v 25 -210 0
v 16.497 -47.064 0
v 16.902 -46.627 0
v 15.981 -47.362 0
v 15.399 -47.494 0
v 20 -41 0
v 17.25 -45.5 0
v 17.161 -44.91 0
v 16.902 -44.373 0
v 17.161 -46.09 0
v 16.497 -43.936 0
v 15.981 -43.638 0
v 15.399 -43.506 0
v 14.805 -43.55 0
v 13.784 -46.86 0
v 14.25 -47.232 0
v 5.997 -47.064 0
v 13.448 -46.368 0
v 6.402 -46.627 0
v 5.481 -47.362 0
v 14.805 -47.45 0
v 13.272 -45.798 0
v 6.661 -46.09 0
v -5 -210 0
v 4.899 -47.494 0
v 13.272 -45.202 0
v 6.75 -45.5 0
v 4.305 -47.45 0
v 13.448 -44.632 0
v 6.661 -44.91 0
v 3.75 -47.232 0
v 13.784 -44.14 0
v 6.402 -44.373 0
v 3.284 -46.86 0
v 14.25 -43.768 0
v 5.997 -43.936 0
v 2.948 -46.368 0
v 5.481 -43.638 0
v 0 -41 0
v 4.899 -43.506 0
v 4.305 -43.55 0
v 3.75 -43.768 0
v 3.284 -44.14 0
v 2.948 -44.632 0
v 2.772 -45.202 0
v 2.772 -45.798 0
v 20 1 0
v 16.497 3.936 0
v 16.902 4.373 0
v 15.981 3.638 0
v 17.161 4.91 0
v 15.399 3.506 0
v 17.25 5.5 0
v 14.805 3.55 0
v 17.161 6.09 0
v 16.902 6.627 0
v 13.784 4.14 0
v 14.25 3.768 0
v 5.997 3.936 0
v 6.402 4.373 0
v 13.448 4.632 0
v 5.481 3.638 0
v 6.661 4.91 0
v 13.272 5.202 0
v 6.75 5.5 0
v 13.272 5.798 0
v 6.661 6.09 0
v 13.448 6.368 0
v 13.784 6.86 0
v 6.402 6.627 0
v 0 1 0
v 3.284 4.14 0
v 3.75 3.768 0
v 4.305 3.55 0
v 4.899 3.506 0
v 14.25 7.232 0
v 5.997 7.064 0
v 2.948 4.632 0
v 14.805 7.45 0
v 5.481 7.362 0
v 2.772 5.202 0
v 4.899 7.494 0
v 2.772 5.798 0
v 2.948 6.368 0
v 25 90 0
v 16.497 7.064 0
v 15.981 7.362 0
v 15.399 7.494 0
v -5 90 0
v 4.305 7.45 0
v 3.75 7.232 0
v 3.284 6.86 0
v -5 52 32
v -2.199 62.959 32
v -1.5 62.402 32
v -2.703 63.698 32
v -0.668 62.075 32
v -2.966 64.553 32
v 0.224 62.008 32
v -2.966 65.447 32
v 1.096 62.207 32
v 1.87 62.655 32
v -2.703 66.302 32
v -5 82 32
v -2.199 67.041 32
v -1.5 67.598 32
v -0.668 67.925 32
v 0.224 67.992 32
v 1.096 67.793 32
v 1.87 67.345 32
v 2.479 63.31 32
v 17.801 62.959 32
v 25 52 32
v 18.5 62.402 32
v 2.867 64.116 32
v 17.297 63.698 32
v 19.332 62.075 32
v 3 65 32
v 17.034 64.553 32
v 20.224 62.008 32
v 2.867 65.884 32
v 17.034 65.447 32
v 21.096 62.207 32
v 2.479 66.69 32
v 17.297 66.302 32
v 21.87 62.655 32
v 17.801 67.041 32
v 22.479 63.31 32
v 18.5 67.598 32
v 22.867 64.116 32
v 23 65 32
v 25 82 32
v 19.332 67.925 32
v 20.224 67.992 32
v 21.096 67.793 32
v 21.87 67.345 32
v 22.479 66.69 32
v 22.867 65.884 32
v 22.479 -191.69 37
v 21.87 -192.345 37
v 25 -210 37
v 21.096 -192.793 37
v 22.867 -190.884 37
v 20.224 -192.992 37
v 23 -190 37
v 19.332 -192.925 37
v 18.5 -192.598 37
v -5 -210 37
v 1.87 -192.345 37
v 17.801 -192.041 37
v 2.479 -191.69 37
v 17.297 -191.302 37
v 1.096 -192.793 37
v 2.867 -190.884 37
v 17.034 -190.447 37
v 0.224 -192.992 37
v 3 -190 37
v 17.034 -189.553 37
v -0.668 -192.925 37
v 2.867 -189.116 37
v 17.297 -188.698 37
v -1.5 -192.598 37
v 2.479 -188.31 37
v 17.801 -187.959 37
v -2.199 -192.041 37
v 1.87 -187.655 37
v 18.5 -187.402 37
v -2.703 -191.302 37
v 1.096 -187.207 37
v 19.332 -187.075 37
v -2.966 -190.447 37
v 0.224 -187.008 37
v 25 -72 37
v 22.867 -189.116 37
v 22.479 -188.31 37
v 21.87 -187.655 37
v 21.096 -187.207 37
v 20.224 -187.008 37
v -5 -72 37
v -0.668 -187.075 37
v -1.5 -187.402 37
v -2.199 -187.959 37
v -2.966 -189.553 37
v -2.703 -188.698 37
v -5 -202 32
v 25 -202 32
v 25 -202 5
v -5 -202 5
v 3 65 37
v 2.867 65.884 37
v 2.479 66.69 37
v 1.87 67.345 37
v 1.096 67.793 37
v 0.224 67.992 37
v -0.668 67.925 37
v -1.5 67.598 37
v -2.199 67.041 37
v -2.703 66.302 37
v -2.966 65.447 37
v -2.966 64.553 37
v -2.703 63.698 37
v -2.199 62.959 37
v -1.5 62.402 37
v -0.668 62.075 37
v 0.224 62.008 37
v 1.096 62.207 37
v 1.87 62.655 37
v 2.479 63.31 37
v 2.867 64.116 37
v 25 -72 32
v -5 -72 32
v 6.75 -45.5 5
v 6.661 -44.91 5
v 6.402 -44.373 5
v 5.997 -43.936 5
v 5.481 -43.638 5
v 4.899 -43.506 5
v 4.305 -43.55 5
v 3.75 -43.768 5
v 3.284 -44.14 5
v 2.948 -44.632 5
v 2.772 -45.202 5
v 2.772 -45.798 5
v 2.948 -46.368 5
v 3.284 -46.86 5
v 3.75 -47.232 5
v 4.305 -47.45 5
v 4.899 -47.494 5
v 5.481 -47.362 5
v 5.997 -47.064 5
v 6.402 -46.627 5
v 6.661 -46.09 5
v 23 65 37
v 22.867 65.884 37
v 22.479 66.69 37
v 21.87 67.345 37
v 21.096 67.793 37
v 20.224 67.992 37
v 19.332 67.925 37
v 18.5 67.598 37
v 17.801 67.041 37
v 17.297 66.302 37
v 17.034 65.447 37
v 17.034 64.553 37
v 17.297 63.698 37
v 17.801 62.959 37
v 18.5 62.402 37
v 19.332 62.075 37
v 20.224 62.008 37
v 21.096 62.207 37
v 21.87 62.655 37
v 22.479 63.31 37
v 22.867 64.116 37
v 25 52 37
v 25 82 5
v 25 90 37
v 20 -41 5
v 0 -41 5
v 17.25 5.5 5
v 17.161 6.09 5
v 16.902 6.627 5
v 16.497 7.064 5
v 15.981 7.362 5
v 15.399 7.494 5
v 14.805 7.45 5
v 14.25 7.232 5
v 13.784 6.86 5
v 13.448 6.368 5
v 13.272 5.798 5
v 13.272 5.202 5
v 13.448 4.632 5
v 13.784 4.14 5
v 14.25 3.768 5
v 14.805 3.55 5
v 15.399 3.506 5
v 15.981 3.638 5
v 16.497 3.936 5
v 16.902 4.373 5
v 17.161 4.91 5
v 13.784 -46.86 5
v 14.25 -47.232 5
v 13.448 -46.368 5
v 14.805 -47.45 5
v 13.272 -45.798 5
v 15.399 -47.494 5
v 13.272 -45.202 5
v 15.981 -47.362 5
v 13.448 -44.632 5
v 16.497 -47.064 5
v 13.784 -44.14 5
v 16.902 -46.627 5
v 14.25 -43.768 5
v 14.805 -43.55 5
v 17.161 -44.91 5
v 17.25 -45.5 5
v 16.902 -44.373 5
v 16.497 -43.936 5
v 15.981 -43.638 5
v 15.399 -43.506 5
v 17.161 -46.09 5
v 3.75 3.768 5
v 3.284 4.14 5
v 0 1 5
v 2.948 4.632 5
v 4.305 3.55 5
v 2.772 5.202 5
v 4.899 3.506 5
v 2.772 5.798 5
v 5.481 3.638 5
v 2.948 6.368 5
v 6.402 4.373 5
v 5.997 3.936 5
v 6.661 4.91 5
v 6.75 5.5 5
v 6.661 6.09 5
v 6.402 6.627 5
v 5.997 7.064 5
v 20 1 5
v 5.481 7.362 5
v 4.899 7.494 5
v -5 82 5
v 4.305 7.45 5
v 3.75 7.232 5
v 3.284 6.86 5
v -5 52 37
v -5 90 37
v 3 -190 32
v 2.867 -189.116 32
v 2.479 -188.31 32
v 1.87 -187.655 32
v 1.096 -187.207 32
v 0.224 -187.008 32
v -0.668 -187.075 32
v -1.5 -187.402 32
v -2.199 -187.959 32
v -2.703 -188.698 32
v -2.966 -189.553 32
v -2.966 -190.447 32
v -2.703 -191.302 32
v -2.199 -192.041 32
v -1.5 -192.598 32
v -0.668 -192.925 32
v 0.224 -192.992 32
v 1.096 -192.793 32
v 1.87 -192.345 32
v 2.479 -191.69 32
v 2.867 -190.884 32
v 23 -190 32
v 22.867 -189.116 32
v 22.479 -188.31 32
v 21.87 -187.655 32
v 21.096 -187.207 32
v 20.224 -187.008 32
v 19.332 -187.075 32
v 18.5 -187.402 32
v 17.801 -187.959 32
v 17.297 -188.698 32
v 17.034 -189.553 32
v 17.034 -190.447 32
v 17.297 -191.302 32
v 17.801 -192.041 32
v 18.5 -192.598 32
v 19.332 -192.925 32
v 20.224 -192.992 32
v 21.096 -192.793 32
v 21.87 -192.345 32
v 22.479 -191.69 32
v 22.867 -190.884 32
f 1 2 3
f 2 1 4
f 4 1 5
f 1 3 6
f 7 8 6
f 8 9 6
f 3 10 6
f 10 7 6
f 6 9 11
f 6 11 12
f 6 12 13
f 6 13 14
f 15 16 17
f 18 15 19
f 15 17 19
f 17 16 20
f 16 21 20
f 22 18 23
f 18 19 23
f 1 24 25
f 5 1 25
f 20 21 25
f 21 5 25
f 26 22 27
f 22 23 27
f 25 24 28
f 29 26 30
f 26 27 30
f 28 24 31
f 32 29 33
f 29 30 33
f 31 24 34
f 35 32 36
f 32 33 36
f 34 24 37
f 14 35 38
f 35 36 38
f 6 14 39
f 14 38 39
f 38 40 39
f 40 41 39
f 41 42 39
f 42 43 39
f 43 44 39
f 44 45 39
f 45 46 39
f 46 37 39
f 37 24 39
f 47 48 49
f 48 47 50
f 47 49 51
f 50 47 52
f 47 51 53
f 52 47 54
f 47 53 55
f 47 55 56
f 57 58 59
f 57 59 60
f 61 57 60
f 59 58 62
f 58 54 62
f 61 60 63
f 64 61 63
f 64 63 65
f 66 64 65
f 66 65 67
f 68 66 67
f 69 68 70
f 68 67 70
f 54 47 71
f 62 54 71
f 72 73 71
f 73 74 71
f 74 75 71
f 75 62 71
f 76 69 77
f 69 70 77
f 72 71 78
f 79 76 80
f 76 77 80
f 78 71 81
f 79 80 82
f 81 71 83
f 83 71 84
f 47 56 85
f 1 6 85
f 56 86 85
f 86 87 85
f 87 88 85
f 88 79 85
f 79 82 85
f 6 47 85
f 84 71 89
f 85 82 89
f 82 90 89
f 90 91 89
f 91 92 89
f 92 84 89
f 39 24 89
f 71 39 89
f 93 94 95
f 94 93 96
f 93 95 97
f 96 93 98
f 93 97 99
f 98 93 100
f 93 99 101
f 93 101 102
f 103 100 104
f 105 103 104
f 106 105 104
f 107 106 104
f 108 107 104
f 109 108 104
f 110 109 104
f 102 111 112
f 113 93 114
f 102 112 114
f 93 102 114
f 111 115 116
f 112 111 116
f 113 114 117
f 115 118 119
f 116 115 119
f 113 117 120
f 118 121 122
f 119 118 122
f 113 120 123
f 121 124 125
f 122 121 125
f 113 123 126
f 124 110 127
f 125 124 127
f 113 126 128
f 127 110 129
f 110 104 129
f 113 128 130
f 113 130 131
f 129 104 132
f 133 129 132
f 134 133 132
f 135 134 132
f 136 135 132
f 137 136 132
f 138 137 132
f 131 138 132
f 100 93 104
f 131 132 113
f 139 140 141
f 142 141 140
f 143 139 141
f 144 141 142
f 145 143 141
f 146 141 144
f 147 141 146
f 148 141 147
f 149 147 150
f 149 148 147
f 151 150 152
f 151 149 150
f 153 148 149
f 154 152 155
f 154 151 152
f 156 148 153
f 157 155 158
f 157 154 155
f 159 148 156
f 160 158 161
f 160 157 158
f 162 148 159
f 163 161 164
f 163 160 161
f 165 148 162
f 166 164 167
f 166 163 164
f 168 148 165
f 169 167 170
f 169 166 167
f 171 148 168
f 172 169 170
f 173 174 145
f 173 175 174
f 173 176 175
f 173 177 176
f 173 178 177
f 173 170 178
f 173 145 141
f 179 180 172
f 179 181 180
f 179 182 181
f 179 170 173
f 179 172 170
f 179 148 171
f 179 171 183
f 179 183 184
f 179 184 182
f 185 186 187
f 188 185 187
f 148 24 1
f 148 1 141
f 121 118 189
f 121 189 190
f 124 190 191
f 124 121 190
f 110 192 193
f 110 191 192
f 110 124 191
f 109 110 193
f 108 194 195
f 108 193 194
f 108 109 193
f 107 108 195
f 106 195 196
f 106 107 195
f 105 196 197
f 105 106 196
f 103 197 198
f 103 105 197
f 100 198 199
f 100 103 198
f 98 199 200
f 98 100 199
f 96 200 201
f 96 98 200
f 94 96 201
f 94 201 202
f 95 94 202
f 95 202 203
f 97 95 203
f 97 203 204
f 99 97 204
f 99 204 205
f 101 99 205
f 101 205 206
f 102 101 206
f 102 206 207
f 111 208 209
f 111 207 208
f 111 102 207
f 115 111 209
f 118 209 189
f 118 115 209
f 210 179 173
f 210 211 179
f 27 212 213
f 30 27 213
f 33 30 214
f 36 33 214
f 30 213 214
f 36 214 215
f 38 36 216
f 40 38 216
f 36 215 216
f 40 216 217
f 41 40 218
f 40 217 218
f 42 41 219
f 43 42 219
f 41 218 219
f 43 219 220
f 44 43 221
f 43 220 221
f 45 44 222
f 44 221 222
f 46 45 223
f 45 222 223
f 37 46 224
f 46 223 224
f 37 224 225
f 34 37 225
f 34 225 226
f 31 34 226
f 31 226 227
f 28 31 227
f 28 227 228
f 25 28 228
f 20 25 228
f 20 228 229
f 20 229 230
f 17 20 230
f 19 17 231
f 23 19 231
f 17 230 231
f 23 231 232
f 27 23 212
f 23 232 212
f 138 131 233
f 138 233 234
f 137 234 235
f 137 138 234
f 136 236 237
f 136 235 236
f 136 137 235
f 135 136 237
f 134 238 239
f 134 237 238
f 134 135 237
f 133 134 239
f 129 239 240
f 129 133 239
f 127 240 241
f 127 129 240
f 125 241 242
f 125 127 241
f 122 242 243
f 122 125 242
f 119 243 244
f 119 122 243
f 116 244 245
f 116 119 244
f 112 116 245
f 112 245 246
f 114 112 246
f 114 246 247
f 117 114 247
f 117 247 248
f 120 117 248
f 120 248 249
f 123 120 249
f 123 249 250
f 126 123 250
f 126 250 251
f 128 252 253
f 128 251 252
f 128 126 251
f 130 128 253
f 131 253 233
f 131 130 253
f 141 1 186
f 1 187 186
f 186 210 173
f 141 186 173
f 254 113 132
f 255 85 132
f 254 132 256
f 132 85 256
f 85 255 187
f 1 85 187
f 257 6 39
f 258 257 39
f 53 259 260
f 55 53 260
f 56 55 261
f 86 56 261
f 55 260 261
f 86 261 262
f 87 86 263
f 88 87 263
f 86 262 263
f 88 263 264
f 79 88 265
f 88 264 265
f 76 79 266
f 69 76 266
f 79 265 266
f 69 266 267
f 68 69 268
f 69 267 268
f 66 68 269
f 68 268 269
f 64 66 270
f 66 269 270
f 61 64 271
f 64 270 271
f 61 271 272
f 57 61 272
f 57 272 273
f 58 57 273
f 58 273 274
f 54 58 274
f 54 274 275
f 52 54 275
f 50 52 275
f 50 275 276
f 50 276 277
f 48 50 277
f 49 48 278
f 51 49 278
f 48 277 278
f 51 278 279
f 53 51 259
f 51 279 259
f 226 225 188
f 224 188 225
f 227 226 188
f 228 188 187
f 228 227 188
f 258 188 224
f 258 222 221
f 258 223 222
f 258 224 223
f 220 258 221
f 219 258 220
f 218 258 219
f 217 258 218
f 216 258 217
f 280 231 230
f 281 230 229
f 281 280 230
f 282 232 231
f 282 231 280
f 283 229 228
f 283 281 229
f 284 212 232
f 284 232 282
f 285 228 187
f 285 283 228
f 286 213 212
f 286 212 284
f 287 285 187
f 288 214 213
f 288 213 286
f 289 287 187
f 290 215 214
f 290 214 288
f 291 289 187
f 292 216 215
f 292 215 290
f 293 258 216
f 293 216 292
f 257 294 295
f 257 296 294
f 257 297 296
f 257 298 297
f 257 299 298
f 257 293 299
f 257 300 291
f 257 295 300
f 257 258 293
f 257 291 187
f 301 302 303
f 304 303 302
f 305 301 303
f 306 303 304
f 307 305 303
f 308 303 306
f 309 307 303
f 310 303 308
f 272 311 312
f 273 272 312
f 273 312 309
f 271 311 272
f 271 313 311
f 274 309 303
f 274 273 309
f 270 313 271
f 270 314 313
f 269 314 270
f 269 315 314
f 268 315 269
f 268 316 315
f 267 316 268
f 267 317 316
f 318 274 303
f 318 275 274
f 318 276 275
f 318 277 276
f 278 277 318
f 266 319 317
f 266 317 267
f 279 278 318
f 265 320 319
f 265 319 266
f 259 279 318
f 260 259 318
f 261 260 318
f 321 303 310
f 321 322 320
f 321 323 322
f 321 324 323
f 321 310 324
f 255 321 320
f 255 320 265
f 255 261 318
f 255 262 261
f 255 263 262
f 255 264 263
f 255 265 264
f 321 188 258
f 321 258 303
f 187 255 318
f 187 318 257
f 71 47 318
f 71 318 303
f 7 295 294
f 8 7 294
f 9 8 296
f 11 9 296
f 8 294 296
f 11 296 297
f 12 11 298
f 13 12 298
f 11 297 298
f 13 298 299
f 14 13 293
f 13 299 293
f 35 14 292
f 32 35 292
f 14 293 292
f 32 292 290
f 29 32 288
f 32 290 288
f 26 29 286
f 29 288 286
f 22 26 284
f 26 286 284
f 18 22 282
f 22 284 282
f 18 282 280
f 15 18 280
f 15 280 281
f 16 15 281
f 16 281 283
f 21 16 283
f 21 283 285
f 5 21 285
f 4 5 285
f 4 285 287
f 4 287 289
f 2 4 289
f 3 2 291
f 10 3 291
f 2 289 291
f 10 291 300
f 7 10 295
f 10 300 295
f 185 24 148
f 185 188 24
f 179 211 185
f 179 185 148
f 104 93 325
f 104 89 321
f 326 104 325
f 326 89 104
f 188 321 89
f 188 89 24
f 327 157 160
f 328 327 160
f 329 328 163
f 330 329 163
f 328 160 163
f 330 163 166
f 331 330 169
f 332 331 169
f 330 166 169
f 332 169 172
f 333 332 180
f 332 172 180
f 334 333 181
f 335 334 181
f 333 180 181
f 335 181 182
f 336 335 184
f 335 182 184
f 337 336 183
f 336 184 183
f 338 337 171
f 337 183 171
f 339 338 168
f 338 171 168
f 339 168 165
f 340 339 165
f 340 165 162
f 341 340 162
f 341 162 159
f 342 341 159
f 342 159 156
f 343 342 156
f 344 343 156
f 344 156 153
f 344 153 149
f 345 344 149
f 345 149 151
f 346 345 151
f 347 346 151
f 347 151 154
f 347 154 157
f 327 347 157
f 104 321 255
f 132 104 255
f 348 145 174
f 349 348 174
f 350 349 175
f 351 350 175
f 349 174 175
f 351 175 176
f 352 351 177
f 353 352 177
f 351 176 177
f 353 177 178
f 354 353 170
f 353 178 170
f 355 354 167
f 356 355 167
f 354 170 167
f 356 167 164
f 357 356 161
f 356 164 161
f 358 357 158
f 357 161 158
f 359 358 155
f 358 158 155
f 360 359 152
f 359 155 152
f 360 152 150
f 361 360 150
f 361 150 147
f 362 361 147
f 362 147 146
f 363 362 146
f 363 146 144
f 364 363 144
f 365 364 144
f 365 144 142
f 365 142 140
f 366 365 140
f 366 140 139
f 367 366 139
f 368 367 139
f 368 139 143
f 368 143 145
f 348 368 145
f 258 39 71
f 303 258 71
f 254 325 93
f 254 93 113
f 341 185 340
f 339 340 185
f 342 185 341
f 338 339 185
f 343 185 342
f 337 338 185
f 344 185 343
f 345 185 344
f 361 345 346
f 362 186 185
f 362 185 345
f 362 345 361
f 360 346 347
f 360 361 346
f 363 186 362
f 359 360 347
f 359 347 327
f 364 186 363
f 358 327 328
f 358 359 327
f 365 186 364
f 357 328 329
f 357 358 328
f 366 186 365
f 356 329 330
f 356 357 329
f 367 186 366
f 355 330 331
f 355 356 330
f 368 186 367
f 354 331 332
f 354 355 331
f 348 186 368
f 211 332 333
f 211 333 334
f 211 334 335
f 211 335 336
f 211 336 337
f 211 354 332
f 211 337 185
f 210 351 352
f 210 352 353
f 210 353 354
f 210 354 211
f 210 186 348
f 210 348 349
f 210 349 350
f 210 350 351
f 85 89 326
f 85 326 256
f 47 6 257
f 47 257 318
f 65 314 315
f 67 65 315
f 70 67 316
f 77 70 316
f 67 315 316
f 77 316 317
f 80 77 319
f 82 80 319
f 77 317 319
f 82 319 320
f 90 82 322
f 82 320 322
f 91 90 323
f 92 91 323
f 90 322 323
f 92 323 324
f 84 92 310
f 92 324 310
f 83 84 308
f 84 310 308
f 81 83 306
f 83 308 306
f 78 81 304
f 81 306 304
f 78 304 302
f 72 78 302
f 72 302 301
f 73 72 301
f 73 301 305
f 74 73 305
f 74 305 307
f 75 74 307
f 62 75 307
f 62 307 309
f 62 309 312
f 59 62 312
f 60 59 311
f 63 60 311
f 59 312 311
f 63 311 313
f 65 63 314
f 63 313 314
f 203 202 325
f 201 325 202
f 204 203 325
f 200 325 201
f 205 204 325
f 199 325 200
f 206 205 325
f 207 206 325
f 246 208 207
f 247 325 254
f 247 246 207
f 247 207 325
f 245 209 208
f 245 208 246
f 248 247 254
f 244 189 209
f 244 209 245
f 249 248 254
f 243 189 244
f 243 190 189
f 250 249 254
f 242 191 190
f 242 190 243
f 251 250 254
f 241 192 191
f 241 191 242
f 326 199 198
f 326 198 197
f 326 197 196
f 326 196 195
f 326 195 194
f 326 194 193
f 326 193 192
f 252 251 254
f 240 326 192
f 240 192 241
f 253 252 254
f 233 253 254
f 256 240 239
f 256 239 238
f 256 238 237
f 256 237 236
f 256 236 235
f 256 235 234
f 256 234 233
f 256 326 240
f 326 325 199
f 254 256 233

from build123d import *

# Parameters (mm, degrees)
SKETCH_2_W          = 30
SKETCH_2_H          = 60
SKETCH_2_W_2        = 20
SKETCH_2_H_2        = 40
EXTRUDE_1_DEPTH     = 5
SKETCH_3_R          = 2
CUT_EXTRUDE_1_DEPTH = 5
EXTRUDE_2_DEPTH     = 5
SKETCH_6_R          = 1.5
CUT_EXTRUDE_2_DEPTH = 5
SKETCH_7_W          = 5
SKETCH_7_H          = 10
CUT_EXTRUDE_3_DEPTH = 100
SKETCH_8_W          = 30
SKETCH_8_H          = 5
EXTRUDE_3_DEPTH     = 80
SKETCH_9_W          = 30
SKETCH_9_H          = 5
EXTRUDE_4_DEPTH     = 60
SKETCH_11_W         = 30
SKETCH_11_H         = 8
EXTRUDE_5_DEPTH     = 32
EXTRUDE_6_DEPTH     = 30
SKETCH_14_W         = 30
SKETCH_14_H         = 5
EXTRUDE_7_DEPTH     = 30
SKETCH_15_W         = 37
SKETCH_15_H         = 100
EXTRUDE_8_DEPTH     = 30
SKETCH_12_R         = 3
CUT_EXTRUDE_5_DEPTH = 50
SKETCH_16_W         = 27
SKETCH_16_H         = 100
CUT_EXTRUDE_6_DEPTH = 30
SKETCH_17_R         = 3
CUT_EXTRUDE_7_DEPTH = 30
SKETCH_18_W         = 20
SKETCH_18_H         = 1
CUT_EXTRUDE_8_DEPTH = 10


with BuildPart() as part:
    # 草图2 → 凸台-拉伸1 (new body)
    with BuildSketch(Plane.XY):
        with Locations((10, -20)):
            Rectangle(SKETCH_2_W, SKETCH_2_H)
        with Locations((10, -20)):
            Rectangle(SKETCH_2_W_2, SKETCH_2_H_2, mode=Mode.SUBTRACT)
    extrude(amount=EXTRUDE_1_DEPTH)

    # 草图3 → 切除-拉伸1 (cut)
    with BuildSketch(Plane.XY.offset(5)):
        with Locations((15.25, 5.5)):
            Circle(SKETCH_3_R)
        with Locations((15.25, -45.5)):
            Circle(SKETCH_3_R)
        with Locations((4.75, -45.5)):
            Circle(SKETCH_3_R)
        with Locations((4.75, 5.5)):
            Circle(SKETCH_3_R)
    extrude(amount=-CUT_EXTRUDE_1_DEPTH, mode=Mode.SUBTRACT)

    # 草图5 → 凸台-拉伸2 (add)
    with BuildSketch(Plane(origin=(25, 0, 0), x_dir=(0, 0, -1), z_dir=(1, 0, 0))):
        with BuildLine():
            Line((-5, -42), (-5, -40))
            Line((-5, -40), (0, -40))
            Line((0, -40), (0, -42))
            ThreePointArc((0, -42), (0.878679656, -44.121320344), (3, -45))
            Line((3, -45), (20, -45))
            Line((20, -45), (20, -50))
            Line((20, -50), (0, -50))
            Line((0, -50), (-5, -50))
            Line((-5, -50), (-25, -50))
            Line((-25, -50), (-25, -45))
            Line((-25, -45), (-8, -45))
            ThreePointArc((-8, -45), (-5.878679656, -44.121320344), (-5, -42))
        make_face()
    extrude_2 = extrude(amount=EXTRUDE_2_DEPTH)

    # 镜向1: 凸台-拉伸2 across plane
    add(extrude_2.mirror(Plane(origin=(10, 0, 0), x_dir=(0, 0, 1), z_dir=(1, 0, 0))))

    # 草图6 → 切除-拉伸2 (cut)
    with BuildSketch(Plane(origin=(0, -45, 0), x_dir=(1, 0, 0), z_dir=(0, 1, 0))):
        with Locations((-7.5, 12.5)):
            Circle(SKETCH_6_R)
        with Locations((-7.5, -17.5)):
            Circle(SKETCH_6_R)
        with Locations((27.5, -17.5)):
            Circle(SKETCH_6_R)
        with Locations((27.5, 12.5)):
            Circle(SKETCH_6_R)
    extrude(amount=-CUT_EXTRUDE_2_DEPTH, mode=Mode.SUBTRACT)

    # 草图7 → 切除-拉伸3 (cut)
    with BuildSketch(Plane.XY.offset(25)):
        with Locations((27.5, -45)):
            Rectangle(SKETCH_7_W, SKETCH_7_H)
        with Locations((-7.5, -45)):
            Rectangle(SKETCH_7_W, SKETCH_7_H)
    extrude(amount=-CUT_EXTRUDE_3_DEPTH, mode=Mode.SUBTRACT)

    # 草图8 → 凸台-拉伸3 (add)
    with BuildSketch(Plane(origin=(0, 10, 0), x_dir=(1, 0, 0), z_dir=(0, 1, 0))):
        with Locations((10, -2.5)):
            Rectangle(SKETCH_8_W, SKETCH_8_H)
    extrude(amount=EXTRUDE_3_DEPTH)

    # 草图9 → 凸台-拉伸4 (add)
    with BuildSketch(Plane.XZ.offset(50)):
        with Locations((10, 2.5)):
            Rectangle(SKETCH_9_W, SKETCH_9_H)
    extrude(amount=EXTRUDE_4_DEPTH)

    # 草图11 → 凸台-拉伸5 (add)
    with BuildSketch(Plane.XY.offset(5)):
        with Locations((10, -106)):
            Rectangle(SKETCH_11_W, SKETCH_11_H)
        with Locations((10, 86)):
            Rectangle(SKETCH_11_W, SKETCH_11_H)
    extrude(amount=EXTRUDE_5_DEPTH)

    # 草图13 → 凸台-拉伸6 (add)
    with BuildSketch(Plane(origin=(0, -102, 0), x_dir=(1, 0, 0), z_dir=(0, 1, 0))):
        Polygon((-5, -37), (25, -37), (25, -34.408335309), (25, -32), (-5, -32), align=None)
    extrude(amount=EXTRUDE_6_DEPTH)

    # 草图14 → 凸台-拉伸7 (add)
    with BuildSketch(Plane.XZ.offset(-82)):
        with Locations((10, 34.5)):
            Rectangle(SKETCH_14_W, SKETCH_14_H)
    extrude(amount=EXTRUDE_7_DEPTH)

    # 草图15 → 凸台-拉伸8 (add)
    with BuildSketch(Plane.ZY.offset(5)):
        with Locations((18.5, -160)):
            Rectangle(SKETCH_15_W, SKETCH_15_H)
    extrude(amount=-EXTRUDE_8_DEPTH)

    # 草图12 → 切除-拉伸5 (cut)
    with BuildSketch(Plane.XY.offset(5)):
        with Locations((0, 65)):
            Circle(SKETCH_12_R)
        with Locations((20, 65)):
            Circle(SKETCH_12_R)
    extrude(amount=CUT_EXTRUDE_5_DEPTH, mode=Mode.SUBTRACT)

    # 草图16 → 切除-拉伸6 (cut)
    with BuildSketch(Plane(origin=(25, 0, 0), x_dir=(0, 0, -1), z_dir=(1, 0, 0))):
        with Locations((-18.5, -152)):
            Rectangle(SKETCH_16_W, SKETCH_16_H)
    extrude(amount=-CUT_EXTRUDE_6_DEPTH, mode=Mode.SUBTRACT)

    # 草图17 → 切除-拉伸7 (cut)
    with BuildSketch(Plane.XY.offset(37)):
        with Locations((20, -190)):
            Circle(SKETCH_17_R)
        with Locations((0, -190)):
            Circle(SKETCH_17_R)
    extrude(amount=-CUT_EXTRUDE_7_DEPTH, mode=Mode.SUBTRACT)

    # 草图18 → 切除-拉伸8 (cut)
    with BuildSketch(Plane(origin=(0, 0, 0), x_dir=(-1, 0, 0), z_dir=(0, 0, -1))):
        with Locations((-10, -40.5)):
            Rectangle(SKETCH_18_W, SKETCH_18_H)
        with Locations((-10, 0.5)):
            Rectangle(SKETCH_18_W, SKETCH_18_H)
    extrude(amount=-CUT_EXTRUDE_8_DEPTH, mode=Mode.SUBTRACT)


solid = part.part
